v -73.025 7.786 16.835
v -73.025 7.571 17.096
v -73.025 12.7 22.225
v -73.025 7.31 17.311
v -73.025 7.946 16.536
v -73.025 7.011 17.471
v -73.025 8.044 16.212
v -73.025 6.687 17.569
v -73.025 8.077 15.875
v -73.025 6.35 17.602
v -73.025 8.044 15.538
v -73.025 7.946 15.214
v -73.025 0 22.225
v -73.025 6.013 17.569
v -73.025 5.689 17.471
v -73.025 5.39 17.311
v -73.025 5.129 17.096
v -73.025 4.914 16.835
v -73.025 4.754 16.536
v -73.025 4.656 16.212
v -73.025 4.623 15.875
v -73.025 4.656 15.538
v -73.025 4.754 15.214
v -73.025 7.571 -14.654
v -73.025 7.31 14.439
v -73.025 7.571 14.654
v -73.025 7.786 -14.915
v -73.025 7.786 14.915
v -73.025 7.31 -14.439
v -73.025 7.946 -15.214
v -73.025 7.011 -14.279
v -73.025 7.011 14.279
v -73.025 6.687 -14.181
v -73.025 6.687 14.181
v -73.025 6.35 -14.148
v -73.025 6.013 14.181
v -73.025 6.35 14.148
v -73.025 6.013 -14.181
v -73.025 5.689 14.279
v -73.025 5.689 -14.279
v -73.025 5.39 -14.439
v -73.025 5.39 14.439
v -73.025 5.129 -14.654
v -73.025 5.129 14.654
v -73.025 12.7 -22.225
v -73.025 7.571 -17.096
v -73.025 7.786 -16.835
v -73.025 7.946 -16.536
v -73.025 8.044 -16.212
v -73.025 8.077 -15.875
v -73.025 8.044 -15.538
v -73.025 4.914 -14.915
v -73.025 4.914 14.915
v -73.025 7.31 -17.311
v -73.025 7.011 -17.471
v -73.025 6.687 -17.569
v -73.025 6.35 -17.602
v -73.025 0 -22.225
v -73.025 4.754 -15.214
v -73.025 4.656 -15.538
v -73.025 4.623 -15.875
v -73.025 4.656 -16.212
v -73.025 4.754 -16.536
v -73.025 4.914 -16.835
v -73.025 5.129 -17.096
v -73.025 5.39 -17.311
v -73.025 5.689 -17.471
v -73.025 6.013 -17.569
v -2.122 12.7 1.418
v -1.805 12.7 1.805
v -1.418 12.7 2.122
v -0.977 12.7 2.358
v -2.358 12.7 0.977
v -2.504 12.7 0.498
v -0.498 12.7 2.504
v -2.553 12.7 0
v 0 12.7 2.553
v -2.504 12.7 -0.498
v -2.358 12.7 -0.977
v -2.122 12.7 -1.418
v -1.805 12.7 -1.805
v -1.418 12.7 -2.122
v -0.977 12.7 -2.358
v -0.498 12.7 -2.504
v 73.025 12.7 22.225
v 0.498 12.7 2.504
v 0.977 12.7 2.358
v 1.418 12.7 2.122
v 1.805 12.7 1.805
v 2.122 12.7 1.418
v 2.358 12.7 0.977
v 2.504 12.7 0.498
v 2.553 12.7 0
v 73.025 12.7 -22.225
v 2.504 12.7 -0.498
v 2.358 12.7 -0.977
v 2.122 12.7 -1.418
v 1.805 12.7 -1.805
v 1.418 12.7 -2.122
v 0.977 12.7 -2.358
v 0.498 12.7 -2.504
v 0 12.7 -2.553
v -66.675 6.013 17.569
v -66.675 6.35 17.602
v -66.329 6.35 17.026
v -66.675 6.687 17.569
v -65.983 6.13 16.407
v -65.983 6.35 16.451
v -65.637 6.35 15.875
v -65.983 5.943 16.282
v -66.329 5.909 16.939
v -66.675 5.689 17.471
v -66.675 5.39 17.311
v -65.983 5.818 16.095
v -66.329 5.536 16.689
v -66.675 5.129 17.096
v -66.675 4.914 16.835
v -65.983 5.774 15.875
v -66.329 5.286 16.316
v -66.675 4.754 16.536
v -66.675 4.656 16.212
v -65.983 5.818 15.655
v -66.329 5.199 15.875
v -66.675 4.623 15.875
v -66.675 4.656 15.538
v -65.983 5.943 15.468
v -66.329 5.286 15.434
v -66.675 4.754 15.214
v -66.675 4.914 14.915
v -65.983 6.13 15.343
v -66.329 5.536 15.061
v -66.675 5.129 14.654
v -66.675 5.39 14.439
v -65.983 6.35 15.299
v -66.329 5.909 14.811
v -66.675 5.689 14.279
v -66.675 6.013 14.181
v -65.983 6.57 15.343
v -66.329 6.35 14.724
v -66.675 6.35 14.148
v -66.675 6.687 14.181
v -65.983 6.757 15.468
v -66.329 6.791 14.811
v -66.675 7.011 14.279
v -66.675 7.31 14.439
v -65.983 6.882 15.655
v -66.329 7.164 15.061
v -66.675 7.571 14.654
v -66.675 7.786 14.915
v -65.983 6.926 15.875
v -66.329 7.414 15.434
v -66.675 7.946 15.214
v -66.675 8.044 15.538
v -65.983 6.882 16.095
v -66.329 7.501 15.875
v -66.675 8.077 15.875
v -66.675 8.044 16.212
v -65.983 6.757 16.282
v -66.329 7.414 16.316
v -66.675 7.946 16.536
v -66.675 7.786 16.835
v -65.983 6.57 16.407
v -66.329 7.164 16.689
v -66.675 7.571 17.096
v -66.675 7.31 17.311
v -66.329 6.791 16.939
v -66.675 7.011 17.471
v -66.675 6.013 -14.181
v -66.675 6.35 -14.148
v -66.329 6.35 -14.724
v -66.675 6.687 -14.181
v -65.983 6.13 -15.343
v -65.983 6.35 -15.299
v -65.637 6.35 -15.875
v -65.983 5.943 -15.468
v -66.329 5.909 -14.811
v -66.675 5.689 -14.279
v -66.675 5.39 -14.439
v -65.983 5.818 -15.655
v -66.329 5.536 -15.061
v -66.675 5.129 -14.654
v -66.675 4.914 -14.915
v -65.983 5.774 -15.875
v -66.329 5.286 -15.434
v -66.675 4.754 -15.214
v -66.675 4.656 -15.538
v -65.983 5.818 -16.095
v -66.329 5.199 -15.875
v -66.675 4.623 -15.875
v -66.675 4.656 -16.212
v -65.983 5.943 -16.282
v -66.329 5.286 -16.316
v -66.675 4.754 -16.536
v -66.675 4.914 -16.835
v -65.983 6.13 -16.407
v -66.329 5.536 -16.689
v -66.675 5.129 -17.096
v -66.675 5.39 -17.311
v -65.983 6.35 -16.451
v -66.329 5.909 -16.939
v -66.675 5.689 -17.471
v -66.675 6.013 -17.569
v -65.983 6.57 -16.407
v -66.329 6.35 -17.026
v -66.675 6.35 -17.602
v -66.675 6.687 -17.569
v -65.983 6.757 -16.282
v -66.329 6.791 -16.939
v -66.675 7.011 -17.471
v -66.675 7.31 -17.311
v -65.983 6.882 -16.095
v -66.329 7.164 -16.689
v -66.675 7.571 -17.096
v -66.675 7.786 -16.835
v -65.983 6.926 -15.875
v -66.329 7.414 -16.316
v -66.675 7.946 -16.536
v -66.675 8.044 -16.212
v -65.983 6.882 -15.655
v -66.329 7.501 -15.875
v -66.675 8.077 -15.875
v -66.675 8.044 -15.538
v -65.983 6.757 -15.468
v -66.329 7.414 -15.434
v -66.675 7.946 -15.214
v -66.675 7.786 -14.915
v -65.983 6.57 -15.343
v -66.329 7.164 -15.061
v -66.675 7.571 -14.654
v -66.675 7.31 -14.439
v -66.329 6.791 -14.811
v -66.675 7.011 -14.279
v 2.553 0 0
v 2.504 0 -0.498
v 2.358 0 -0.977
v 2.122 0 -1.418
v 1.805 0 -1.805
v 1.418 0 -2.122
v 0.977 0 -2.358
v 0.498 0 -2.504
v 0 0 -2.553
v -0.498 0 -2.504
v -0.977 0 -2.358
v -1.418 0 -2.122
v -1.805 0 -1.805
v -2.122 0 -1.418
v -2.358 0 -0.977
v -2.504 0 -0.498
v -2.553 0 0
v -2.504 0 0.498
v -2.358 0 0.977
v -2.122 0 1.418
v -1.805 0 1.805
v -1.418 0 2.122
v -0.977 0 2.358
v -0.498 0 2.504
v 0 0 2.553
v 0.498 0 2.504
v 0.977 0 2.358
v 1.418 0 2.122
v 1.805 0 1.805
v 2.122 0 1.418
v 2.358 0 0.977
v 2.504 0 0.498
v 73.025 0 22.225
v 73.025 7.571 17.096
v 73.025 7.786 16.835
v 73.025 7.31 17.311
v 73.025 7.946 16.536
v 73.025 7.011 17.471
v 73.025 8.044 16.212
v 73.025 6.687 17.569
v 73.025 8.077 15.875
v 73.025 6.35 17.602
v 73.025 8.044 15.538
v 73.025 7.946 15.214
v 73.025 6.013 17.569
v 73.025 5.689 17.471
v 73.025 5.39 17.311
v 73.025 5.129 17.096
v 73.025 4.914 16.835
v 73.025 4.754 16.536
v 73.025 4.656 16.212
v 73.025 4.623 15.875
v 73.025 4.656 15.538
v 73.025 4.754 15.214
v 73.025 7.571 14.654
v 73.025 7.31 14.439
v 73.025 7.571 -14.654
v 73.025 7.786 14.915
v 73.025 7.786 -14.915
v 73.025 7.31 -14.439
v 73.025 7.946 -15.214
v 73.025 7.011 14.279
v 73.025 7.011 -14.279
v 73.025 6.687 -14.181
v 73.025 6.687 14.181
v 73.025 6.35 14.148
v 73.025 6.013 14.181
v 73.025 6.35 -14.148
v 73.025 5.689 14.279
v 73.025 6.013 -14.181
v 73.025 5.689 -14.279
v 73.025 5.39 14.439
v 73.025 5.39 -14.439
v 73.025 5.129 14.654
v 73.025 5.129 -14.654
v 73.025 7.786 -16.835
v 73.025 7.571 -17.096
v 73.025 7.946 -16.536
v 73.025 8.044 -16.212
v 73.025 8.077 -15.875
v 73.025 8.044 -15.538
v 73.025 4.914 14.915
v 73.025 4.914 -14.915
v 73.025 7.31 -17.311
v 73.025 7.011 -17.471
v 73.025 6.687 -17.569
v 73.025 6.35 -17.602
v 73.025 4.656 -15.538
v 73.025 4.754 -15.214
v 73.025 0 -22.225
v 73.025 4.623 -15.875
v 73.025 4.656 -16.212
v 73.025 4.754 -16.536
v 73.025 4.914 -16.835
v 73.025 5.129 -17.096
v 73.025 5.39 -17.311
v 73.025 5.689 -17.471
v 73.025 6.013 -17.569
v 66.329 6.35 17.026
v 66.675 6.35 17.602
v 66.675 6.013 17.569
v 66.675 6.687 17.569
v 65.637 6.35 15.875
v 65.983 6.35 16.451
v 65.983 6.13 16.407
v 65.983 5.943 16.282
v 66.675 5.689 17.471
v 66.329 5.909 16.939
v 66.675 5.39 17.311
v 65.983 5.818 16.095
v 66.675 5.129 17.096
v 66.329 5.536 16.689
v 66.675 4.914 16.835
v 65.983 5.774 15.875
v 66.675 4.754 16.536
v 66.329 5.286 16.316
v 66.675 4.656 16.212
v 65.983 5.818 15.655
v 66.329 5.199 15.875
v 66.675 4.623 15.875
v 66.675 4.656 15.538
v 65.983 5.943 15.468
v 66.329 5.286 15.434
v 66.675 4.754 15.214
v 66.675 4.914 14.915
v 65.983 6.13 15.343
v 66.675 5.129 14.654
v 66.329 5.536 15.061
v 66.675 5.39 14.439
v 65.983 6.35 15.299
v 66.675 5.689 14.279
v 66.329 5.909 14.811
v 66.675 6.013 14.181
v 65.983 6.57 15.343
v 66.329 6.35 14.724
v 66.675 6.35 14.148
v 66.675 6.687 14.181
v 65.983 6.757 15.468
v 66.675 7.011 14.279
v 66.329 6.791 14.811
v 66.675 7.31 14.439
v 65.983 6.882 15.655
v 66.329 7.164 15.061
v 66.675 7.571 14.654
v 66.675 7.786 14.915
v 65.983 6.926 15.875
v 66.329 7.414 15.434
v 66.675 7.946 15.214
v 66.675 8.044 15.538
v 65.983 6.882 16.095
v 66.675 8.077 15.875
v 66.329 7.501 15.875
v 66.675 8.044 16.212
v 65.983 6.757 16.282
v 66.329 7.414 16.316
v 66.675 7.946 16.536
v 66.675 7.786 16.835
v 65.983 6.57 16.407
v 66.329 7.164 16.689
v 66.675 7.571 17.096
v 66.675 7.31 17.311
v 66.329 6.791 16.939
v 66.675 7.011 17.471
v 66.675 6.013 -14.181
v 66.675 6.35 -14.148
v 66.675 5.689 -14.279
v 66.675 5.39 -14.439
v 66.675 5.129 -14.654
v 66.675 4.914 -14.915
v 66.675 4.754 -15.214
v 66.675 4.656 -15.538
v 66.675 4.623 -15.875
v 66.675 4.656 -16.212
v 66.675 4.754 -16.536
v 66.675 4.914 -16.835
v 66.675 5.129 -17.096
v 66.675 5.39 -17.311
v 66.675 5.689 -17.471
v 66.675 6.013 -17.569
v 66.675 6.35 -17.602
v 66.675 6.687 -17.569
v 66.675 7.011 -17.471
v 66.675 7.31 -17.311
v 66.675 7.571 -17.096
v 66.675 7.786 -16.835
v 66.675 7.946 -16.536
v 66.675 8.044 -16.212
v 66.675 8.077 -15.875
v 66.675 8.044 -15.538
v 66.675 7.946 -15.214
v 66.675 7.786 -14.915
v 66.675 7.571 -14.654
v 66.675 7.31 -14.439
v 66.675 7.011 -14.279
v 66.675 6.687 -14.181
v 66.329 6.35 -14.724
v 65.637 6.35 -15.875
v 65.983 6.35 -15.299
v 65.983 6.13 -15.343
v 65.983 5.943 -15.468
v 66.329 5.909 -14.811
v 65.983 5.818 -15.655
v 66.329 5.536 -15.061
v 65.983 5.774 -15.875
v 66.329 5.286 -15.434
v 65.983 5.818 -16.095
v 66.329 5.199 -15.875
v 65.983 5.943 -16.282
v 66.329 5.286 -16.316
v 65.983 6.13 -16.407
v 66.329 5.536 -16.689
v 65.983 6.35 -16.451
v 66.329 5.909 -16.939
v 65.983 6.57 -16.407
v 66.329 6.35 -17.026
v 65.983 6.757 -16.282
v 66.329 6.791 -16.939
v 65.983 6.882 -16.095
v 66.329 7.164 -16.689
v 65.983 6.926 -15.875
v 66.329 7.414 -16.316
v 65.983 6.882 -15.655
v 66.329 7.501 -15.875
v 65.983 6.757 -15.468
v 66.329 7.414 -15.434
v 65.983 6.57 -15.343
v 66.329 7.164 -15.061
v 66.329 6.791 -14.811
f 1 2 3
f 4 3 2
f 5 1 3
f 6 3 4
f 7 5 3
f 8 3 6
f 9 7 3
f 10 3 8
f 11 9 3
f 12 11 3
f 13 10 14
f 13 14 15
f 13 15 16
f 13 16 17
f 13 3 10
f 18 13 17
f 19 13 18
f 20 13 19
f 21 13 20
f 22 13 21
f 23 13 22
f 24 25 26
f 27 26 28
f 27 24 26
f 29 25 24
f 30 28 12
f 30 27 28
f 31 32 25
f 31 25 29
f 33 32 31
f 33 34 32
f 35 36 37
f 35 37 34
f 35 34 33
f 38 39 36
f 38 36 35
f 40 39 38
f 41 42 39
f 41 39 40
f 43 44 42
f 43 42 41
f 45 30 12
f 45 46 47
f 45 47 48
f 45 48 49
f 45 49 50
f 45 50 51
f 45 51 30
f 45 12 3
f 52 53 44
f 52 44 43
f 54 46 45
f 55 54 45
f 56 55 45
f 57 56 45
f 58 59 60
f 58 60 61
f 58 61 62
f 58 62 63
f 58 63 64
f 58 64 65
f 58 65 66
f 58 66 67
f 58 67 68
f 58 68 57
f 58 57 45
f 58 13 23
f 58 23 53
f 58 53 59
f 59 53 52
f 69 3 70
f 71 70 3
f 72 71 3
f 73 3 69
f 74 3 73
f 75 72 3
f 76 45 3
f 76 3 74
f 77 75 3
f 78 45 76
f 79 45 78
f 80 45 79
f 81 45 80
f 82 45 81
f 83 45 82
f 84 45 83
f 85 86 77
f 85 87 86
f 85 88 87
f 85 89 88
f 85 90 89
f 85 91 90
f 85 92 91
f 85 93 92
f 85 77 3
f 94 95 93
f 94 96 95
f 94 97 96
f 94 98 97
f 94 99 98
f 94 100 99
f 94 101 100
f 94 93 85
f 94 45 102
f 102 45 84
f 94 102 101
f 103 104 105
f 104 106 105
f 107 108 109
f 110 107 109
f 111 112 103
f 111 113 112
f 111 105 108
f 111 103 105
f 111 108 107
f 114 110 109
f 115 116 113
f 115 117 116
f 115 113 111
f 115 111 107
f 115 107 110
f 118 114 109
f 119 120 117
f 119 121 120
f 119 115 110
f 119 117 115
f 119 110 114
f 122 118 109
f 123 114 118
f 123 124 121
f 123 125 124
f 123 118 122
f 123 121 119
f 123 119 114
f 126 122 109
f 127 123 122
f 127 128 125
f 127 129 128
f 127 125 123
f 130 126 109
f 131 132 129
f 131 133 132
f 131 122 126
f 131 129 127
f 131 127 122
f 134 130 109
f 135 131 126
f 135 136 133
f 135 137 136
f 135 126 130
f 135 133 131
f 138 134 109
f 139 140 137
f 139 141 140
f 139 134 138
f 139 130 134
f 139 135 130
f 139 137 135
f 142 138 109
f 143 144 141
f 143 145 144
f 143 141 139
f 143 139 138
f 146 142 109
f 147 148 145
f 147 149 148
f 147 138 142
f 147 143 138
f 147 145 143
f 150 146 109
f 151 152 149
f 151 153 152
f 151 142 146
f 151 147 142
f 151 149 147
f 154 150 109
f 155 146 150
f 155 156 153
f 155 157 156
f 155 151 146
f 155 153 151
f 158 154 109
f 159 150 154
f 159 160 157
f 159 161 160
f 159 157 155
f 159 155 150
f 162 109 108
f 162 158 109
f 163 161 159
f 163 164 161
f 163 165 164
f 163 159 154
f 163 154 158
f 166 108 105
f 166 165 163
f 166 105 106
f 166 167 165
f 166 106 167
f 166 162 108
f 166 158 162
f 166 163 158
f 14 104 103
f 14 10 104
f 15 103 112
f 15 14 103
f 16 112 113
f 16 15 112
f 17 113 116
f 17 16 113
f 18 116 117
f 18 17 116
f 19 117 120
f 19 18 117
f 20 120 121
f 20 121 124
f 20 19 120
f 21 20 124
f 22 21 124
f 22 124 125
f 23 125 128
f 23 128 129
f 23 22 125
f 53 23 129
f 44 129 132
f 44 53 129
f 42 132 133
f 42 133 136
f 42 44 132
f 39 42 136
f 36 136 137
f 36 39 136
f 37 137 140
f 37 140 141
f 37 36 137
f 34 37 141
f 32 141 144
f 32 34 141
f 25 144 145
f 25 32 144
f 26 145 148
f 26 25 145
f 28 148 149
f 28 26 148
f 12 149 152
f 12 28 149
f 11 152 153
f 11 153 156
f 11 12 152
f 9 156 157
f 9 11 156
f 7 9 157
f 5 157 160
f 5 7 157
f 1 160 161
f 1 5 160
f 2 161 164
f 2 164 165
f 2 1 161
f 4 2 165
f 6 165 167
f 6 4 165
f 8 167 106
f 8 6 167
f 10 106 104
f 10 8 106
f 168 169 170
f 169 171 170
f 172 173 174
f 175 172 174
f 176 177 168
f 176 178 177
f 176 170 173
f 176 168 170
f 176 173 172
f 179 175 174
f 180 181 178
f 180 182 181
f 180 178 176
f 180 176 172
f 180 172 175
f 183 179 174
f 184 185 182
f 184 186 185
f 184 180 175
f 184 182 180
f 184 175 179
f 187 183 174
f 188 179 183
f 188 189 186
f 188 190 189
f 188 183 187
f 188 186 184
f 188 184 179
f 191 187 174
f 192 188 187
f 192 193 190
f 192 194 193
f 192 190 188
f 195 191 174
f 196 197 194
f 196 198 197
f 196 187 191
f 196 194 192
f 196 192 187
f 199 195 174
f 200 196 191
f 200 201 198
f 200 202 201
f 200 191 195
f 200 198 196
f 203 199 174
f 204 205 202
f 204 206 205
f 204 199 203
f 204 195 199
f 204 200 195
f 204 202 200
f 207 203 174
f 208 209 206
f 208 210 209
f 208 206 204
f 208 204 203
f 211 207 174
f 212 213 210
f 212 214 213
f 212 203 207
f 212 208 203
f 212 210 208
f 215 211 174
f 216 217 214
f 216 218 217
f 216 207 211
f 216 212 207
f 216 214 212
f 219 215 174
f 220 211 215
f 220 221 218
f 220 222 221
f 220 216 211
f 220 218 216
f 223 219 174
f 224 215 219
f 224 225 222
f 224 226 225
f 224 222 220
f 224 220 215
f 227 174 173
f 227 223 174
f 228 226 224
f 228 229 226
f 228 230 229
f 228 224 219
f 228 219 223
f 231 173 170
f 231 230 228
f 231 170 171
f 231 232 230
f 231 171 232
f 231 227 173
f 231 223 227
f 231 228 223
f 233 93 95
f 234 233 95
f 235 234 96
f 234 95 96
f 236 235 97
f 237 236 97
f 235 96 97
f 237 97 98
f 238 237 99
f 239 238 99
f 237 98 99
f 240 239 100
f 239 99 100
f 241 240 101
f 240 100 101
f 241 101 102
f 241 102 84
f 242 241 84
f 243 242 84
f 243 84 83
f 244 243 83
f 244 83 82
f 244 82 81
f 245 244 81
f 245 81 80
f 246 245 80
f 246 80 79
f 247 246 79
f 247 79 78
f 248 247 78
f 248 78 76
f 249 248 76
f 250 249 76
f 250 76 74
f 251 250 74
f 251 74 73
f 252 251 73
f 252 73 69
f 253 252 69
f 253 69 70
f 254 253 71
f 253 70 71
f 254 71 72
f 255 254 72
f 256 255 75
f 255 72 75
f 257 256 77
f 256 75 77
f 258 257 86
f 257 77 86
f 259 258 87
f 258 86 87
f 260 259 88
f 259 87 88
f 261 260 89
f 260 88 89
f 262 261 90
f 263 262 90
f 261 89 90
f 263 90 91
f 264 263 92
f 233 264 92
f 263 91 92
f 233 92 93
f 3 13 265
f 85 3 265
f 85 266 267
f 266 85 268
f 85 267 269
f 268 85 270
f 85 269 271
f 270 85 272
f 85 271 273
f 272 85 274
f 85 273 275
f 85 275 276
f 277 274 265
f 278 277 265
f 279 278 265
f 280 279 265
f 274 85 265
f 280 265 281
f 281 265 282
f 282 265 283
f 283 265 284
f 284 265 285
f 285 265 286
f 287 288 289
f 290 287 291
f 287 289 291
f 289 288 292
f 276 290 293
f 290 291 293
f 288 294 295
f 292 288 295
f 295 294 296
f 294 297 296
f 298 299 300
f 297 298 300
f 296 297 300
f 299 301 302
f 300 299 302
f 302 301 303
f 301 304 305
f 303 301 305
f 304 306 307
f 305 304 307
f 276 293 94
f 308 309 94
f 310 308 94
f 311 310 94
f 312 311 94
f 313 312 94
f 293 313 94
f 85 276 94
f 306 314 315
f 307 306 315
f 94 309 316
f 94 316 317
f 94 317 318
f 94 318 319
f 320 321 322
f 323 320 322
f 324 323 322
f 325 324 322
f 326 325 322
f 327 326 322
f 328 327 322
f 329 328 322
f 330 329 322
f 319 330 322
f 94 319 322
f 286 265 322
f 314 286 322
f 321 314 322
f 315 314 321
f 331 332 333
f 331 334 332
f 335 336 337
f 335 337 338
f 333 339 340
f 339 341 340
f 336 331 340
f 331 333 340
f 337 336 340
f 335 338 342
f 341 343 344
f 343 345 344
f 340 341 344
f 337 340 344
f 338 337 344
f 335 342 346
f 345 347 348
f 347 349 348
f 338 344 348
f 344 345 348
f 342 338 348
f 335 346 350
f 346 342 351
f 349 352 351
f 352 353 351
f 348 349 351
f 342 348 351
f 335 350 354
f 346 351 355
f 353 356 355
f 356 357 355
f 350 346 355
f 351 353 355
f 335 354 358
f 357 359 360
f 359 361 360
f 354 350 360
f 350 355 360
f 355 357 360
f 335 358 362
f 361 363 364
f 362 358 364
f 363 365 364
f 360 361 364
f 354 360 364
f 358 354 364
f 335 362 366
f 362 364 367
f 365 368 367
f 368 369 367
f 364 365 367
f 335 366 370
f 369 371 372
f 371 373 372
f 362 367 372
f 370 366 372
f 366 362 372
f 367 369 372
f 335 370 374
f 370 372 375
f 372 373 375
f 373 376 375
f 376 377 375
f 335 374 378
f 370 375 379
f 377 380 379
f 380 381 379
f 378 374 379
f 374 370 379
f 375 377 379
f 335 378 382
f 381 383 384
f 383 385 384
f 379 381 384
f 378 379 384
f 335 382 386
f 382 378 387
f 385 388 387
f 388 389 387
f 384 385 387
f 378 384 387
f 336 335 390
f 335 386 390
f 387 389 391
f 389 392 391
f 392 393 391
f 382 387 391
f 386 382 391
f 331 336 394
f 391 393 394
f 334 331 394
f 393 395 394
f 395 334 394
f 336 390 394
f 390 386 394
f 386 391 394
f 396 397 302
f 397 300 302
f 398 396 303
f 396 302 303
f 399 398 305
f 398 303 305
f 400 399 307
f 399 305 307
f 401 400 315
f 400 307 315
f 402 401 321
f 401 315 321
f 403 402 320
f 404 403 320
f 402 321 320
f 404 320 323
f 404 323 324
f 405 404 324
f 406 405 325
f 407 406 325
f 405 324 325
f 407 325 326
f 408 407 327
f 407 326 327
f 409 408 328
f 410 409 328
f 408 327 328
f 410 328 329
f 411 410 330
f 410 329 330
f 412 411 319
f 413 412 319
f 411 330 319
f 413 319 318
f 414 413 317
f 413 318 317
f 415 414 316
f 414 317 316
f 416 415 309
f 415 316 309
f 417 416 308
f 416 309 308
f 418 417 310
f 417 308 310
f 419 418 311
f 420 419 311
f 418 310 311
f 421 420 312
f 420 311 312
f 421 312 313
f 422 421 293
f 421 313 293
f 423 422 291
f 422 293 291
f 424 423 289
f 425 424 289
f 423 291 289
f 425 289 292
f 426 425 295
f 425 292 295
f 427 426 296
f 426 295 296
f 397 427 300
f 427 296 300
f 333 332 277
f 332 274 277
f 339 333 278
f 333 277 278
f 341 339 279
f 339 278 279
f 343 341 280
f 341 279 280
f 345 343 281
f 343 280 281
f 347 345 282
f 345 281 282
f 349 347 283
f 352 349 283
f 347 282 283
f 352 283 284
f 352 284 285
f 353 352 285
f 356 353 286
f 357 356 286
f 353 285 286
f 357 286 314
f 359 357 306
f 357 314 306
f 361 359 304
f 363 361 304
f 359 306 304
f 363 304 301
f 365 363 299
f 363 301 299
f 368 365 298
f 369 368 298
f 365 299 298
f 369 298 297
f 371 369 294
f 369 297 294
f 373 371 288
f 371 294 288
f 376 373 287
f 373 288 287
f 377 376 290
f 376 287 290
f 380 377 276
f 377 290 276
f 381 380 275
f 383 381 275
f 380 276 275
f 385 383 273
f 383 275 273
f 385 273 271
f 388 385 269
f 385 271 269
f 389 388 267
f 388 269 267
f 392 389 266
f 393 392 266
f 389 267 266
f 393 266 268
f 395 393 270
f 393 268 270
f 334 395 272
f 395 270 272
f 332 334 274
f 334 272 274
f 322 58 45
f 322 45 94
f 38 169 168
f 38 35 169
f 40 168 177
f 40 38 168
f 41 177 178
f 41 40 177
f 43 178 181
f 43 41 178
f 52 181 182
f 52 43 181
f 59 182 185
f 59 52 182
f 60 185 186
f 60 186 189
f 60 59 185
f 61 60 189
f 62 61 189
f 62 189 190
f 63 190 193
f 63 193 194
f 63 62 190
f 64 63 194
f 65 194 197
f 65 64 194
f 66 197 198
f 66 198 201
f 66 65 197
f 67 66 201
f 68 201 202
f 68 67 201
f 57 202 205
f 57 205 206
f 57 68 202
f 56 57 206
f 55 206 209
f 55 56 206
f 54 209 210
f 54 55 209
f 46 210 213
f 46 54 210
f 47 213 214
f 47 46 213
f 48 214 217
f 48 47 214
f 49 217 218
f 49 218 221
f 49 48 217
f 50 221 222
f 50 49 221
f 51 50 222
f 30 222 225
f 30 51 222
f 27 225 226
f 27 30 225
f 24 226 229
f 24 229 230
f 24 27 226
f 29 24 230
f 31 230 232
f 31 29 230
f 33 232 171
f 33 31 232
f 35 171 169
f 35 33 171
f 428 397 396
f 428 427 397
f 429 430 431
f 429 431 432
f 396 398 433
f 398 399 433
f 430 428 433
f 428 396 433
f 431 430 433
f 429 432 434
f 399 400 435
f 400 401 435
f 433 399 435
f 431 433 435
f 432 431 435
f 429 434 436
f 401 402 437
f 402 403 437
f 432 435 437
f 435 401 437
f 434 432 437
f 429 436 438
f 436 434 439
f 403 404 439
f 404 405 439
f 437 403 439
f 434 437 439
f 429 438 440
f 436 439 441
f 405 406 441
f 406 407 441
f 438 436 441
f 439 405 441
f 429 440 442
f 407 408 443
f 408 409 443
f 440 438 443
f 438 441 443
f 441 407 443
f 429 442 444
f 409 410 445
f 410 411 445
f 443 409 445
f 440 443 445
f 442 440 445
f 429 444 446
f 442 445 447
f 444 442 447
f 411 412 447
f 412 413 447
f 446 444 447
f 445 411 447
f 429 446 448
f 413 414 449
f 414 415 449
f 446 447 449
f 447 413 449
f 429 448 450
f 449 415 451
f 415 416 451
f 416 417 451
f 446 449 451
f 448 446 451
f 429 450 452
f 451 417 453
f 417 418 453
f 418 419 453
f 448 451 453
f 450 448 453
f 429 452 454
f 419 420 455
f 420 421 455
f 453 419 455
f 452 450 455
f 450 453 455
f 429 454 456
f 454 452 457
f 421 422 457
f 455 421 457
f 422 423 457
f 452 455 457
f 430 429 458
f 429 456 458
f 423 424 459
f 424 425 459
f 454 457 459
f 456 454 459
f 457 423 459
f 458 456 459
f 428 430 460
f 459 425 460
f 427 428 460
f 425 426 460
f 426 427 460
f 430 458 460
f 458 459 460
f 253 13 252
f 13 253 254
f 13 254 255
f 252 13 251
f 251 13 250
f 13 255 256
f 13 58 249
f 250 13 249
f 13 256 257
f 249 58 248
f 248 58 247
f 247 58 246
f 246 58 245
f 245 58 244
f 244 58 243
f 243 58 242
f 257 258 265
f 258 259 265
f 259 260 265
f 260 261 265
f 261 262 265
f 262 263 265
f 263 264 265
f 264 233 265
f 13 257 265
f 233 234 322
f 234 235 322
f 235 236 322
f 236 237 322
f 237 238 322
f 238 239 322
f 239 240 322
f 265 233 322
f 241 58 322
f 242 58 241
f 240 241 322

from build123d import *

# Parameters (mm, degrees)
SKETCH2_W                      = 146.05
SKETCH2_H                      = 44.45
BOSS_EXTRUDE1_DEPTH            = 12.7
F_1_4_20_TAPPED_HOLE1_D        = 5.1054
F_8_32_TAPPED_HOLE1_AT_2_COUNT = 2
F_8_32_TAPPED_HOLE1_AT_2_PITCH = 31.75


with BuildPart() as part:
    # Sketch2 → Boss-Extrude1 (new body)
    with BuildSketch(Plane(origin=(0, 0, 0), x_dir=(1, 0, 0), z_dir=(0, 1, 0))):
        Rectangle(SKETCH2_W, SKETCH2_H)
    extrude(amount=BOSS_EXTRUDE1_DEPTH)

    # 1/4-20 Tapped Hole1 (through all)
    with Locations(Plane(origin=(0, 0, 0), x_dir=(-1, 0, 0), z_dir=(0, -1, 0))):
        with Locations((0, 0)):
            Hole(F_1_4_20_TAPPED_HOLE1_D / 2)

    # Sketch7 → #8-32 Tapped Hole1 (revolve, cut)
    with BuildSketch(Plane(origin=(-73.025, 6.35, -15.875), x_dir=(0, 0, 1), z_dir=(0, 1, 0))):
        Polygon((0, 0), (0, 7.387806461), (1.7272, 6.35), (1.7272, 0), align=None)
    f_8_32_tapped_hole1 = revolve(axis=Axis((-79.375, 6.35, -15.875), (1, 0, 0)), mode=Mode.SUBTRACT)

    # #8-32 Tapped Hole1 at 2: #8-32 Tapped Hole1 ×2
    with Locations(*[(0, 0, i * F_8_32_TAPPED_HOLE1_AT_2_PITCH) for i in range(1, F_8_32_TAPPED_HOLE1_AT_2_COUNT)]):
        add(f_8_32_tapped_hole1, mode=Mode.SUBTRACT)

    # Mirror1: #8-32 Tapped Hole1 across plane
    add(f_8_32_tapped_hole1.mirror(Plane(origin=(0, 0, 0), x_dir=(0, 0, 1), z_dir=(1, 0, 0))), mode=Mode.SUBTRACT)

    # Mirror1 copy 1 sketch → Mirror1 copy 1 (revolve, cut)
    with BuildSketch(Plane(origin=(73.025, 6.35, 15.875), x_dir=(0, 0, 1), z_dir=(0, 1, 0))):
        Polygon((0, 0), (0, -7.387806461), (1.7272, -6.35), (1.7272, 0), align=None)
    revolve(axis=Axis((79.375, 6.35, 15.875), (1, 0, 0)), mode=Mode.SUBTRACT)


solid = part.part
